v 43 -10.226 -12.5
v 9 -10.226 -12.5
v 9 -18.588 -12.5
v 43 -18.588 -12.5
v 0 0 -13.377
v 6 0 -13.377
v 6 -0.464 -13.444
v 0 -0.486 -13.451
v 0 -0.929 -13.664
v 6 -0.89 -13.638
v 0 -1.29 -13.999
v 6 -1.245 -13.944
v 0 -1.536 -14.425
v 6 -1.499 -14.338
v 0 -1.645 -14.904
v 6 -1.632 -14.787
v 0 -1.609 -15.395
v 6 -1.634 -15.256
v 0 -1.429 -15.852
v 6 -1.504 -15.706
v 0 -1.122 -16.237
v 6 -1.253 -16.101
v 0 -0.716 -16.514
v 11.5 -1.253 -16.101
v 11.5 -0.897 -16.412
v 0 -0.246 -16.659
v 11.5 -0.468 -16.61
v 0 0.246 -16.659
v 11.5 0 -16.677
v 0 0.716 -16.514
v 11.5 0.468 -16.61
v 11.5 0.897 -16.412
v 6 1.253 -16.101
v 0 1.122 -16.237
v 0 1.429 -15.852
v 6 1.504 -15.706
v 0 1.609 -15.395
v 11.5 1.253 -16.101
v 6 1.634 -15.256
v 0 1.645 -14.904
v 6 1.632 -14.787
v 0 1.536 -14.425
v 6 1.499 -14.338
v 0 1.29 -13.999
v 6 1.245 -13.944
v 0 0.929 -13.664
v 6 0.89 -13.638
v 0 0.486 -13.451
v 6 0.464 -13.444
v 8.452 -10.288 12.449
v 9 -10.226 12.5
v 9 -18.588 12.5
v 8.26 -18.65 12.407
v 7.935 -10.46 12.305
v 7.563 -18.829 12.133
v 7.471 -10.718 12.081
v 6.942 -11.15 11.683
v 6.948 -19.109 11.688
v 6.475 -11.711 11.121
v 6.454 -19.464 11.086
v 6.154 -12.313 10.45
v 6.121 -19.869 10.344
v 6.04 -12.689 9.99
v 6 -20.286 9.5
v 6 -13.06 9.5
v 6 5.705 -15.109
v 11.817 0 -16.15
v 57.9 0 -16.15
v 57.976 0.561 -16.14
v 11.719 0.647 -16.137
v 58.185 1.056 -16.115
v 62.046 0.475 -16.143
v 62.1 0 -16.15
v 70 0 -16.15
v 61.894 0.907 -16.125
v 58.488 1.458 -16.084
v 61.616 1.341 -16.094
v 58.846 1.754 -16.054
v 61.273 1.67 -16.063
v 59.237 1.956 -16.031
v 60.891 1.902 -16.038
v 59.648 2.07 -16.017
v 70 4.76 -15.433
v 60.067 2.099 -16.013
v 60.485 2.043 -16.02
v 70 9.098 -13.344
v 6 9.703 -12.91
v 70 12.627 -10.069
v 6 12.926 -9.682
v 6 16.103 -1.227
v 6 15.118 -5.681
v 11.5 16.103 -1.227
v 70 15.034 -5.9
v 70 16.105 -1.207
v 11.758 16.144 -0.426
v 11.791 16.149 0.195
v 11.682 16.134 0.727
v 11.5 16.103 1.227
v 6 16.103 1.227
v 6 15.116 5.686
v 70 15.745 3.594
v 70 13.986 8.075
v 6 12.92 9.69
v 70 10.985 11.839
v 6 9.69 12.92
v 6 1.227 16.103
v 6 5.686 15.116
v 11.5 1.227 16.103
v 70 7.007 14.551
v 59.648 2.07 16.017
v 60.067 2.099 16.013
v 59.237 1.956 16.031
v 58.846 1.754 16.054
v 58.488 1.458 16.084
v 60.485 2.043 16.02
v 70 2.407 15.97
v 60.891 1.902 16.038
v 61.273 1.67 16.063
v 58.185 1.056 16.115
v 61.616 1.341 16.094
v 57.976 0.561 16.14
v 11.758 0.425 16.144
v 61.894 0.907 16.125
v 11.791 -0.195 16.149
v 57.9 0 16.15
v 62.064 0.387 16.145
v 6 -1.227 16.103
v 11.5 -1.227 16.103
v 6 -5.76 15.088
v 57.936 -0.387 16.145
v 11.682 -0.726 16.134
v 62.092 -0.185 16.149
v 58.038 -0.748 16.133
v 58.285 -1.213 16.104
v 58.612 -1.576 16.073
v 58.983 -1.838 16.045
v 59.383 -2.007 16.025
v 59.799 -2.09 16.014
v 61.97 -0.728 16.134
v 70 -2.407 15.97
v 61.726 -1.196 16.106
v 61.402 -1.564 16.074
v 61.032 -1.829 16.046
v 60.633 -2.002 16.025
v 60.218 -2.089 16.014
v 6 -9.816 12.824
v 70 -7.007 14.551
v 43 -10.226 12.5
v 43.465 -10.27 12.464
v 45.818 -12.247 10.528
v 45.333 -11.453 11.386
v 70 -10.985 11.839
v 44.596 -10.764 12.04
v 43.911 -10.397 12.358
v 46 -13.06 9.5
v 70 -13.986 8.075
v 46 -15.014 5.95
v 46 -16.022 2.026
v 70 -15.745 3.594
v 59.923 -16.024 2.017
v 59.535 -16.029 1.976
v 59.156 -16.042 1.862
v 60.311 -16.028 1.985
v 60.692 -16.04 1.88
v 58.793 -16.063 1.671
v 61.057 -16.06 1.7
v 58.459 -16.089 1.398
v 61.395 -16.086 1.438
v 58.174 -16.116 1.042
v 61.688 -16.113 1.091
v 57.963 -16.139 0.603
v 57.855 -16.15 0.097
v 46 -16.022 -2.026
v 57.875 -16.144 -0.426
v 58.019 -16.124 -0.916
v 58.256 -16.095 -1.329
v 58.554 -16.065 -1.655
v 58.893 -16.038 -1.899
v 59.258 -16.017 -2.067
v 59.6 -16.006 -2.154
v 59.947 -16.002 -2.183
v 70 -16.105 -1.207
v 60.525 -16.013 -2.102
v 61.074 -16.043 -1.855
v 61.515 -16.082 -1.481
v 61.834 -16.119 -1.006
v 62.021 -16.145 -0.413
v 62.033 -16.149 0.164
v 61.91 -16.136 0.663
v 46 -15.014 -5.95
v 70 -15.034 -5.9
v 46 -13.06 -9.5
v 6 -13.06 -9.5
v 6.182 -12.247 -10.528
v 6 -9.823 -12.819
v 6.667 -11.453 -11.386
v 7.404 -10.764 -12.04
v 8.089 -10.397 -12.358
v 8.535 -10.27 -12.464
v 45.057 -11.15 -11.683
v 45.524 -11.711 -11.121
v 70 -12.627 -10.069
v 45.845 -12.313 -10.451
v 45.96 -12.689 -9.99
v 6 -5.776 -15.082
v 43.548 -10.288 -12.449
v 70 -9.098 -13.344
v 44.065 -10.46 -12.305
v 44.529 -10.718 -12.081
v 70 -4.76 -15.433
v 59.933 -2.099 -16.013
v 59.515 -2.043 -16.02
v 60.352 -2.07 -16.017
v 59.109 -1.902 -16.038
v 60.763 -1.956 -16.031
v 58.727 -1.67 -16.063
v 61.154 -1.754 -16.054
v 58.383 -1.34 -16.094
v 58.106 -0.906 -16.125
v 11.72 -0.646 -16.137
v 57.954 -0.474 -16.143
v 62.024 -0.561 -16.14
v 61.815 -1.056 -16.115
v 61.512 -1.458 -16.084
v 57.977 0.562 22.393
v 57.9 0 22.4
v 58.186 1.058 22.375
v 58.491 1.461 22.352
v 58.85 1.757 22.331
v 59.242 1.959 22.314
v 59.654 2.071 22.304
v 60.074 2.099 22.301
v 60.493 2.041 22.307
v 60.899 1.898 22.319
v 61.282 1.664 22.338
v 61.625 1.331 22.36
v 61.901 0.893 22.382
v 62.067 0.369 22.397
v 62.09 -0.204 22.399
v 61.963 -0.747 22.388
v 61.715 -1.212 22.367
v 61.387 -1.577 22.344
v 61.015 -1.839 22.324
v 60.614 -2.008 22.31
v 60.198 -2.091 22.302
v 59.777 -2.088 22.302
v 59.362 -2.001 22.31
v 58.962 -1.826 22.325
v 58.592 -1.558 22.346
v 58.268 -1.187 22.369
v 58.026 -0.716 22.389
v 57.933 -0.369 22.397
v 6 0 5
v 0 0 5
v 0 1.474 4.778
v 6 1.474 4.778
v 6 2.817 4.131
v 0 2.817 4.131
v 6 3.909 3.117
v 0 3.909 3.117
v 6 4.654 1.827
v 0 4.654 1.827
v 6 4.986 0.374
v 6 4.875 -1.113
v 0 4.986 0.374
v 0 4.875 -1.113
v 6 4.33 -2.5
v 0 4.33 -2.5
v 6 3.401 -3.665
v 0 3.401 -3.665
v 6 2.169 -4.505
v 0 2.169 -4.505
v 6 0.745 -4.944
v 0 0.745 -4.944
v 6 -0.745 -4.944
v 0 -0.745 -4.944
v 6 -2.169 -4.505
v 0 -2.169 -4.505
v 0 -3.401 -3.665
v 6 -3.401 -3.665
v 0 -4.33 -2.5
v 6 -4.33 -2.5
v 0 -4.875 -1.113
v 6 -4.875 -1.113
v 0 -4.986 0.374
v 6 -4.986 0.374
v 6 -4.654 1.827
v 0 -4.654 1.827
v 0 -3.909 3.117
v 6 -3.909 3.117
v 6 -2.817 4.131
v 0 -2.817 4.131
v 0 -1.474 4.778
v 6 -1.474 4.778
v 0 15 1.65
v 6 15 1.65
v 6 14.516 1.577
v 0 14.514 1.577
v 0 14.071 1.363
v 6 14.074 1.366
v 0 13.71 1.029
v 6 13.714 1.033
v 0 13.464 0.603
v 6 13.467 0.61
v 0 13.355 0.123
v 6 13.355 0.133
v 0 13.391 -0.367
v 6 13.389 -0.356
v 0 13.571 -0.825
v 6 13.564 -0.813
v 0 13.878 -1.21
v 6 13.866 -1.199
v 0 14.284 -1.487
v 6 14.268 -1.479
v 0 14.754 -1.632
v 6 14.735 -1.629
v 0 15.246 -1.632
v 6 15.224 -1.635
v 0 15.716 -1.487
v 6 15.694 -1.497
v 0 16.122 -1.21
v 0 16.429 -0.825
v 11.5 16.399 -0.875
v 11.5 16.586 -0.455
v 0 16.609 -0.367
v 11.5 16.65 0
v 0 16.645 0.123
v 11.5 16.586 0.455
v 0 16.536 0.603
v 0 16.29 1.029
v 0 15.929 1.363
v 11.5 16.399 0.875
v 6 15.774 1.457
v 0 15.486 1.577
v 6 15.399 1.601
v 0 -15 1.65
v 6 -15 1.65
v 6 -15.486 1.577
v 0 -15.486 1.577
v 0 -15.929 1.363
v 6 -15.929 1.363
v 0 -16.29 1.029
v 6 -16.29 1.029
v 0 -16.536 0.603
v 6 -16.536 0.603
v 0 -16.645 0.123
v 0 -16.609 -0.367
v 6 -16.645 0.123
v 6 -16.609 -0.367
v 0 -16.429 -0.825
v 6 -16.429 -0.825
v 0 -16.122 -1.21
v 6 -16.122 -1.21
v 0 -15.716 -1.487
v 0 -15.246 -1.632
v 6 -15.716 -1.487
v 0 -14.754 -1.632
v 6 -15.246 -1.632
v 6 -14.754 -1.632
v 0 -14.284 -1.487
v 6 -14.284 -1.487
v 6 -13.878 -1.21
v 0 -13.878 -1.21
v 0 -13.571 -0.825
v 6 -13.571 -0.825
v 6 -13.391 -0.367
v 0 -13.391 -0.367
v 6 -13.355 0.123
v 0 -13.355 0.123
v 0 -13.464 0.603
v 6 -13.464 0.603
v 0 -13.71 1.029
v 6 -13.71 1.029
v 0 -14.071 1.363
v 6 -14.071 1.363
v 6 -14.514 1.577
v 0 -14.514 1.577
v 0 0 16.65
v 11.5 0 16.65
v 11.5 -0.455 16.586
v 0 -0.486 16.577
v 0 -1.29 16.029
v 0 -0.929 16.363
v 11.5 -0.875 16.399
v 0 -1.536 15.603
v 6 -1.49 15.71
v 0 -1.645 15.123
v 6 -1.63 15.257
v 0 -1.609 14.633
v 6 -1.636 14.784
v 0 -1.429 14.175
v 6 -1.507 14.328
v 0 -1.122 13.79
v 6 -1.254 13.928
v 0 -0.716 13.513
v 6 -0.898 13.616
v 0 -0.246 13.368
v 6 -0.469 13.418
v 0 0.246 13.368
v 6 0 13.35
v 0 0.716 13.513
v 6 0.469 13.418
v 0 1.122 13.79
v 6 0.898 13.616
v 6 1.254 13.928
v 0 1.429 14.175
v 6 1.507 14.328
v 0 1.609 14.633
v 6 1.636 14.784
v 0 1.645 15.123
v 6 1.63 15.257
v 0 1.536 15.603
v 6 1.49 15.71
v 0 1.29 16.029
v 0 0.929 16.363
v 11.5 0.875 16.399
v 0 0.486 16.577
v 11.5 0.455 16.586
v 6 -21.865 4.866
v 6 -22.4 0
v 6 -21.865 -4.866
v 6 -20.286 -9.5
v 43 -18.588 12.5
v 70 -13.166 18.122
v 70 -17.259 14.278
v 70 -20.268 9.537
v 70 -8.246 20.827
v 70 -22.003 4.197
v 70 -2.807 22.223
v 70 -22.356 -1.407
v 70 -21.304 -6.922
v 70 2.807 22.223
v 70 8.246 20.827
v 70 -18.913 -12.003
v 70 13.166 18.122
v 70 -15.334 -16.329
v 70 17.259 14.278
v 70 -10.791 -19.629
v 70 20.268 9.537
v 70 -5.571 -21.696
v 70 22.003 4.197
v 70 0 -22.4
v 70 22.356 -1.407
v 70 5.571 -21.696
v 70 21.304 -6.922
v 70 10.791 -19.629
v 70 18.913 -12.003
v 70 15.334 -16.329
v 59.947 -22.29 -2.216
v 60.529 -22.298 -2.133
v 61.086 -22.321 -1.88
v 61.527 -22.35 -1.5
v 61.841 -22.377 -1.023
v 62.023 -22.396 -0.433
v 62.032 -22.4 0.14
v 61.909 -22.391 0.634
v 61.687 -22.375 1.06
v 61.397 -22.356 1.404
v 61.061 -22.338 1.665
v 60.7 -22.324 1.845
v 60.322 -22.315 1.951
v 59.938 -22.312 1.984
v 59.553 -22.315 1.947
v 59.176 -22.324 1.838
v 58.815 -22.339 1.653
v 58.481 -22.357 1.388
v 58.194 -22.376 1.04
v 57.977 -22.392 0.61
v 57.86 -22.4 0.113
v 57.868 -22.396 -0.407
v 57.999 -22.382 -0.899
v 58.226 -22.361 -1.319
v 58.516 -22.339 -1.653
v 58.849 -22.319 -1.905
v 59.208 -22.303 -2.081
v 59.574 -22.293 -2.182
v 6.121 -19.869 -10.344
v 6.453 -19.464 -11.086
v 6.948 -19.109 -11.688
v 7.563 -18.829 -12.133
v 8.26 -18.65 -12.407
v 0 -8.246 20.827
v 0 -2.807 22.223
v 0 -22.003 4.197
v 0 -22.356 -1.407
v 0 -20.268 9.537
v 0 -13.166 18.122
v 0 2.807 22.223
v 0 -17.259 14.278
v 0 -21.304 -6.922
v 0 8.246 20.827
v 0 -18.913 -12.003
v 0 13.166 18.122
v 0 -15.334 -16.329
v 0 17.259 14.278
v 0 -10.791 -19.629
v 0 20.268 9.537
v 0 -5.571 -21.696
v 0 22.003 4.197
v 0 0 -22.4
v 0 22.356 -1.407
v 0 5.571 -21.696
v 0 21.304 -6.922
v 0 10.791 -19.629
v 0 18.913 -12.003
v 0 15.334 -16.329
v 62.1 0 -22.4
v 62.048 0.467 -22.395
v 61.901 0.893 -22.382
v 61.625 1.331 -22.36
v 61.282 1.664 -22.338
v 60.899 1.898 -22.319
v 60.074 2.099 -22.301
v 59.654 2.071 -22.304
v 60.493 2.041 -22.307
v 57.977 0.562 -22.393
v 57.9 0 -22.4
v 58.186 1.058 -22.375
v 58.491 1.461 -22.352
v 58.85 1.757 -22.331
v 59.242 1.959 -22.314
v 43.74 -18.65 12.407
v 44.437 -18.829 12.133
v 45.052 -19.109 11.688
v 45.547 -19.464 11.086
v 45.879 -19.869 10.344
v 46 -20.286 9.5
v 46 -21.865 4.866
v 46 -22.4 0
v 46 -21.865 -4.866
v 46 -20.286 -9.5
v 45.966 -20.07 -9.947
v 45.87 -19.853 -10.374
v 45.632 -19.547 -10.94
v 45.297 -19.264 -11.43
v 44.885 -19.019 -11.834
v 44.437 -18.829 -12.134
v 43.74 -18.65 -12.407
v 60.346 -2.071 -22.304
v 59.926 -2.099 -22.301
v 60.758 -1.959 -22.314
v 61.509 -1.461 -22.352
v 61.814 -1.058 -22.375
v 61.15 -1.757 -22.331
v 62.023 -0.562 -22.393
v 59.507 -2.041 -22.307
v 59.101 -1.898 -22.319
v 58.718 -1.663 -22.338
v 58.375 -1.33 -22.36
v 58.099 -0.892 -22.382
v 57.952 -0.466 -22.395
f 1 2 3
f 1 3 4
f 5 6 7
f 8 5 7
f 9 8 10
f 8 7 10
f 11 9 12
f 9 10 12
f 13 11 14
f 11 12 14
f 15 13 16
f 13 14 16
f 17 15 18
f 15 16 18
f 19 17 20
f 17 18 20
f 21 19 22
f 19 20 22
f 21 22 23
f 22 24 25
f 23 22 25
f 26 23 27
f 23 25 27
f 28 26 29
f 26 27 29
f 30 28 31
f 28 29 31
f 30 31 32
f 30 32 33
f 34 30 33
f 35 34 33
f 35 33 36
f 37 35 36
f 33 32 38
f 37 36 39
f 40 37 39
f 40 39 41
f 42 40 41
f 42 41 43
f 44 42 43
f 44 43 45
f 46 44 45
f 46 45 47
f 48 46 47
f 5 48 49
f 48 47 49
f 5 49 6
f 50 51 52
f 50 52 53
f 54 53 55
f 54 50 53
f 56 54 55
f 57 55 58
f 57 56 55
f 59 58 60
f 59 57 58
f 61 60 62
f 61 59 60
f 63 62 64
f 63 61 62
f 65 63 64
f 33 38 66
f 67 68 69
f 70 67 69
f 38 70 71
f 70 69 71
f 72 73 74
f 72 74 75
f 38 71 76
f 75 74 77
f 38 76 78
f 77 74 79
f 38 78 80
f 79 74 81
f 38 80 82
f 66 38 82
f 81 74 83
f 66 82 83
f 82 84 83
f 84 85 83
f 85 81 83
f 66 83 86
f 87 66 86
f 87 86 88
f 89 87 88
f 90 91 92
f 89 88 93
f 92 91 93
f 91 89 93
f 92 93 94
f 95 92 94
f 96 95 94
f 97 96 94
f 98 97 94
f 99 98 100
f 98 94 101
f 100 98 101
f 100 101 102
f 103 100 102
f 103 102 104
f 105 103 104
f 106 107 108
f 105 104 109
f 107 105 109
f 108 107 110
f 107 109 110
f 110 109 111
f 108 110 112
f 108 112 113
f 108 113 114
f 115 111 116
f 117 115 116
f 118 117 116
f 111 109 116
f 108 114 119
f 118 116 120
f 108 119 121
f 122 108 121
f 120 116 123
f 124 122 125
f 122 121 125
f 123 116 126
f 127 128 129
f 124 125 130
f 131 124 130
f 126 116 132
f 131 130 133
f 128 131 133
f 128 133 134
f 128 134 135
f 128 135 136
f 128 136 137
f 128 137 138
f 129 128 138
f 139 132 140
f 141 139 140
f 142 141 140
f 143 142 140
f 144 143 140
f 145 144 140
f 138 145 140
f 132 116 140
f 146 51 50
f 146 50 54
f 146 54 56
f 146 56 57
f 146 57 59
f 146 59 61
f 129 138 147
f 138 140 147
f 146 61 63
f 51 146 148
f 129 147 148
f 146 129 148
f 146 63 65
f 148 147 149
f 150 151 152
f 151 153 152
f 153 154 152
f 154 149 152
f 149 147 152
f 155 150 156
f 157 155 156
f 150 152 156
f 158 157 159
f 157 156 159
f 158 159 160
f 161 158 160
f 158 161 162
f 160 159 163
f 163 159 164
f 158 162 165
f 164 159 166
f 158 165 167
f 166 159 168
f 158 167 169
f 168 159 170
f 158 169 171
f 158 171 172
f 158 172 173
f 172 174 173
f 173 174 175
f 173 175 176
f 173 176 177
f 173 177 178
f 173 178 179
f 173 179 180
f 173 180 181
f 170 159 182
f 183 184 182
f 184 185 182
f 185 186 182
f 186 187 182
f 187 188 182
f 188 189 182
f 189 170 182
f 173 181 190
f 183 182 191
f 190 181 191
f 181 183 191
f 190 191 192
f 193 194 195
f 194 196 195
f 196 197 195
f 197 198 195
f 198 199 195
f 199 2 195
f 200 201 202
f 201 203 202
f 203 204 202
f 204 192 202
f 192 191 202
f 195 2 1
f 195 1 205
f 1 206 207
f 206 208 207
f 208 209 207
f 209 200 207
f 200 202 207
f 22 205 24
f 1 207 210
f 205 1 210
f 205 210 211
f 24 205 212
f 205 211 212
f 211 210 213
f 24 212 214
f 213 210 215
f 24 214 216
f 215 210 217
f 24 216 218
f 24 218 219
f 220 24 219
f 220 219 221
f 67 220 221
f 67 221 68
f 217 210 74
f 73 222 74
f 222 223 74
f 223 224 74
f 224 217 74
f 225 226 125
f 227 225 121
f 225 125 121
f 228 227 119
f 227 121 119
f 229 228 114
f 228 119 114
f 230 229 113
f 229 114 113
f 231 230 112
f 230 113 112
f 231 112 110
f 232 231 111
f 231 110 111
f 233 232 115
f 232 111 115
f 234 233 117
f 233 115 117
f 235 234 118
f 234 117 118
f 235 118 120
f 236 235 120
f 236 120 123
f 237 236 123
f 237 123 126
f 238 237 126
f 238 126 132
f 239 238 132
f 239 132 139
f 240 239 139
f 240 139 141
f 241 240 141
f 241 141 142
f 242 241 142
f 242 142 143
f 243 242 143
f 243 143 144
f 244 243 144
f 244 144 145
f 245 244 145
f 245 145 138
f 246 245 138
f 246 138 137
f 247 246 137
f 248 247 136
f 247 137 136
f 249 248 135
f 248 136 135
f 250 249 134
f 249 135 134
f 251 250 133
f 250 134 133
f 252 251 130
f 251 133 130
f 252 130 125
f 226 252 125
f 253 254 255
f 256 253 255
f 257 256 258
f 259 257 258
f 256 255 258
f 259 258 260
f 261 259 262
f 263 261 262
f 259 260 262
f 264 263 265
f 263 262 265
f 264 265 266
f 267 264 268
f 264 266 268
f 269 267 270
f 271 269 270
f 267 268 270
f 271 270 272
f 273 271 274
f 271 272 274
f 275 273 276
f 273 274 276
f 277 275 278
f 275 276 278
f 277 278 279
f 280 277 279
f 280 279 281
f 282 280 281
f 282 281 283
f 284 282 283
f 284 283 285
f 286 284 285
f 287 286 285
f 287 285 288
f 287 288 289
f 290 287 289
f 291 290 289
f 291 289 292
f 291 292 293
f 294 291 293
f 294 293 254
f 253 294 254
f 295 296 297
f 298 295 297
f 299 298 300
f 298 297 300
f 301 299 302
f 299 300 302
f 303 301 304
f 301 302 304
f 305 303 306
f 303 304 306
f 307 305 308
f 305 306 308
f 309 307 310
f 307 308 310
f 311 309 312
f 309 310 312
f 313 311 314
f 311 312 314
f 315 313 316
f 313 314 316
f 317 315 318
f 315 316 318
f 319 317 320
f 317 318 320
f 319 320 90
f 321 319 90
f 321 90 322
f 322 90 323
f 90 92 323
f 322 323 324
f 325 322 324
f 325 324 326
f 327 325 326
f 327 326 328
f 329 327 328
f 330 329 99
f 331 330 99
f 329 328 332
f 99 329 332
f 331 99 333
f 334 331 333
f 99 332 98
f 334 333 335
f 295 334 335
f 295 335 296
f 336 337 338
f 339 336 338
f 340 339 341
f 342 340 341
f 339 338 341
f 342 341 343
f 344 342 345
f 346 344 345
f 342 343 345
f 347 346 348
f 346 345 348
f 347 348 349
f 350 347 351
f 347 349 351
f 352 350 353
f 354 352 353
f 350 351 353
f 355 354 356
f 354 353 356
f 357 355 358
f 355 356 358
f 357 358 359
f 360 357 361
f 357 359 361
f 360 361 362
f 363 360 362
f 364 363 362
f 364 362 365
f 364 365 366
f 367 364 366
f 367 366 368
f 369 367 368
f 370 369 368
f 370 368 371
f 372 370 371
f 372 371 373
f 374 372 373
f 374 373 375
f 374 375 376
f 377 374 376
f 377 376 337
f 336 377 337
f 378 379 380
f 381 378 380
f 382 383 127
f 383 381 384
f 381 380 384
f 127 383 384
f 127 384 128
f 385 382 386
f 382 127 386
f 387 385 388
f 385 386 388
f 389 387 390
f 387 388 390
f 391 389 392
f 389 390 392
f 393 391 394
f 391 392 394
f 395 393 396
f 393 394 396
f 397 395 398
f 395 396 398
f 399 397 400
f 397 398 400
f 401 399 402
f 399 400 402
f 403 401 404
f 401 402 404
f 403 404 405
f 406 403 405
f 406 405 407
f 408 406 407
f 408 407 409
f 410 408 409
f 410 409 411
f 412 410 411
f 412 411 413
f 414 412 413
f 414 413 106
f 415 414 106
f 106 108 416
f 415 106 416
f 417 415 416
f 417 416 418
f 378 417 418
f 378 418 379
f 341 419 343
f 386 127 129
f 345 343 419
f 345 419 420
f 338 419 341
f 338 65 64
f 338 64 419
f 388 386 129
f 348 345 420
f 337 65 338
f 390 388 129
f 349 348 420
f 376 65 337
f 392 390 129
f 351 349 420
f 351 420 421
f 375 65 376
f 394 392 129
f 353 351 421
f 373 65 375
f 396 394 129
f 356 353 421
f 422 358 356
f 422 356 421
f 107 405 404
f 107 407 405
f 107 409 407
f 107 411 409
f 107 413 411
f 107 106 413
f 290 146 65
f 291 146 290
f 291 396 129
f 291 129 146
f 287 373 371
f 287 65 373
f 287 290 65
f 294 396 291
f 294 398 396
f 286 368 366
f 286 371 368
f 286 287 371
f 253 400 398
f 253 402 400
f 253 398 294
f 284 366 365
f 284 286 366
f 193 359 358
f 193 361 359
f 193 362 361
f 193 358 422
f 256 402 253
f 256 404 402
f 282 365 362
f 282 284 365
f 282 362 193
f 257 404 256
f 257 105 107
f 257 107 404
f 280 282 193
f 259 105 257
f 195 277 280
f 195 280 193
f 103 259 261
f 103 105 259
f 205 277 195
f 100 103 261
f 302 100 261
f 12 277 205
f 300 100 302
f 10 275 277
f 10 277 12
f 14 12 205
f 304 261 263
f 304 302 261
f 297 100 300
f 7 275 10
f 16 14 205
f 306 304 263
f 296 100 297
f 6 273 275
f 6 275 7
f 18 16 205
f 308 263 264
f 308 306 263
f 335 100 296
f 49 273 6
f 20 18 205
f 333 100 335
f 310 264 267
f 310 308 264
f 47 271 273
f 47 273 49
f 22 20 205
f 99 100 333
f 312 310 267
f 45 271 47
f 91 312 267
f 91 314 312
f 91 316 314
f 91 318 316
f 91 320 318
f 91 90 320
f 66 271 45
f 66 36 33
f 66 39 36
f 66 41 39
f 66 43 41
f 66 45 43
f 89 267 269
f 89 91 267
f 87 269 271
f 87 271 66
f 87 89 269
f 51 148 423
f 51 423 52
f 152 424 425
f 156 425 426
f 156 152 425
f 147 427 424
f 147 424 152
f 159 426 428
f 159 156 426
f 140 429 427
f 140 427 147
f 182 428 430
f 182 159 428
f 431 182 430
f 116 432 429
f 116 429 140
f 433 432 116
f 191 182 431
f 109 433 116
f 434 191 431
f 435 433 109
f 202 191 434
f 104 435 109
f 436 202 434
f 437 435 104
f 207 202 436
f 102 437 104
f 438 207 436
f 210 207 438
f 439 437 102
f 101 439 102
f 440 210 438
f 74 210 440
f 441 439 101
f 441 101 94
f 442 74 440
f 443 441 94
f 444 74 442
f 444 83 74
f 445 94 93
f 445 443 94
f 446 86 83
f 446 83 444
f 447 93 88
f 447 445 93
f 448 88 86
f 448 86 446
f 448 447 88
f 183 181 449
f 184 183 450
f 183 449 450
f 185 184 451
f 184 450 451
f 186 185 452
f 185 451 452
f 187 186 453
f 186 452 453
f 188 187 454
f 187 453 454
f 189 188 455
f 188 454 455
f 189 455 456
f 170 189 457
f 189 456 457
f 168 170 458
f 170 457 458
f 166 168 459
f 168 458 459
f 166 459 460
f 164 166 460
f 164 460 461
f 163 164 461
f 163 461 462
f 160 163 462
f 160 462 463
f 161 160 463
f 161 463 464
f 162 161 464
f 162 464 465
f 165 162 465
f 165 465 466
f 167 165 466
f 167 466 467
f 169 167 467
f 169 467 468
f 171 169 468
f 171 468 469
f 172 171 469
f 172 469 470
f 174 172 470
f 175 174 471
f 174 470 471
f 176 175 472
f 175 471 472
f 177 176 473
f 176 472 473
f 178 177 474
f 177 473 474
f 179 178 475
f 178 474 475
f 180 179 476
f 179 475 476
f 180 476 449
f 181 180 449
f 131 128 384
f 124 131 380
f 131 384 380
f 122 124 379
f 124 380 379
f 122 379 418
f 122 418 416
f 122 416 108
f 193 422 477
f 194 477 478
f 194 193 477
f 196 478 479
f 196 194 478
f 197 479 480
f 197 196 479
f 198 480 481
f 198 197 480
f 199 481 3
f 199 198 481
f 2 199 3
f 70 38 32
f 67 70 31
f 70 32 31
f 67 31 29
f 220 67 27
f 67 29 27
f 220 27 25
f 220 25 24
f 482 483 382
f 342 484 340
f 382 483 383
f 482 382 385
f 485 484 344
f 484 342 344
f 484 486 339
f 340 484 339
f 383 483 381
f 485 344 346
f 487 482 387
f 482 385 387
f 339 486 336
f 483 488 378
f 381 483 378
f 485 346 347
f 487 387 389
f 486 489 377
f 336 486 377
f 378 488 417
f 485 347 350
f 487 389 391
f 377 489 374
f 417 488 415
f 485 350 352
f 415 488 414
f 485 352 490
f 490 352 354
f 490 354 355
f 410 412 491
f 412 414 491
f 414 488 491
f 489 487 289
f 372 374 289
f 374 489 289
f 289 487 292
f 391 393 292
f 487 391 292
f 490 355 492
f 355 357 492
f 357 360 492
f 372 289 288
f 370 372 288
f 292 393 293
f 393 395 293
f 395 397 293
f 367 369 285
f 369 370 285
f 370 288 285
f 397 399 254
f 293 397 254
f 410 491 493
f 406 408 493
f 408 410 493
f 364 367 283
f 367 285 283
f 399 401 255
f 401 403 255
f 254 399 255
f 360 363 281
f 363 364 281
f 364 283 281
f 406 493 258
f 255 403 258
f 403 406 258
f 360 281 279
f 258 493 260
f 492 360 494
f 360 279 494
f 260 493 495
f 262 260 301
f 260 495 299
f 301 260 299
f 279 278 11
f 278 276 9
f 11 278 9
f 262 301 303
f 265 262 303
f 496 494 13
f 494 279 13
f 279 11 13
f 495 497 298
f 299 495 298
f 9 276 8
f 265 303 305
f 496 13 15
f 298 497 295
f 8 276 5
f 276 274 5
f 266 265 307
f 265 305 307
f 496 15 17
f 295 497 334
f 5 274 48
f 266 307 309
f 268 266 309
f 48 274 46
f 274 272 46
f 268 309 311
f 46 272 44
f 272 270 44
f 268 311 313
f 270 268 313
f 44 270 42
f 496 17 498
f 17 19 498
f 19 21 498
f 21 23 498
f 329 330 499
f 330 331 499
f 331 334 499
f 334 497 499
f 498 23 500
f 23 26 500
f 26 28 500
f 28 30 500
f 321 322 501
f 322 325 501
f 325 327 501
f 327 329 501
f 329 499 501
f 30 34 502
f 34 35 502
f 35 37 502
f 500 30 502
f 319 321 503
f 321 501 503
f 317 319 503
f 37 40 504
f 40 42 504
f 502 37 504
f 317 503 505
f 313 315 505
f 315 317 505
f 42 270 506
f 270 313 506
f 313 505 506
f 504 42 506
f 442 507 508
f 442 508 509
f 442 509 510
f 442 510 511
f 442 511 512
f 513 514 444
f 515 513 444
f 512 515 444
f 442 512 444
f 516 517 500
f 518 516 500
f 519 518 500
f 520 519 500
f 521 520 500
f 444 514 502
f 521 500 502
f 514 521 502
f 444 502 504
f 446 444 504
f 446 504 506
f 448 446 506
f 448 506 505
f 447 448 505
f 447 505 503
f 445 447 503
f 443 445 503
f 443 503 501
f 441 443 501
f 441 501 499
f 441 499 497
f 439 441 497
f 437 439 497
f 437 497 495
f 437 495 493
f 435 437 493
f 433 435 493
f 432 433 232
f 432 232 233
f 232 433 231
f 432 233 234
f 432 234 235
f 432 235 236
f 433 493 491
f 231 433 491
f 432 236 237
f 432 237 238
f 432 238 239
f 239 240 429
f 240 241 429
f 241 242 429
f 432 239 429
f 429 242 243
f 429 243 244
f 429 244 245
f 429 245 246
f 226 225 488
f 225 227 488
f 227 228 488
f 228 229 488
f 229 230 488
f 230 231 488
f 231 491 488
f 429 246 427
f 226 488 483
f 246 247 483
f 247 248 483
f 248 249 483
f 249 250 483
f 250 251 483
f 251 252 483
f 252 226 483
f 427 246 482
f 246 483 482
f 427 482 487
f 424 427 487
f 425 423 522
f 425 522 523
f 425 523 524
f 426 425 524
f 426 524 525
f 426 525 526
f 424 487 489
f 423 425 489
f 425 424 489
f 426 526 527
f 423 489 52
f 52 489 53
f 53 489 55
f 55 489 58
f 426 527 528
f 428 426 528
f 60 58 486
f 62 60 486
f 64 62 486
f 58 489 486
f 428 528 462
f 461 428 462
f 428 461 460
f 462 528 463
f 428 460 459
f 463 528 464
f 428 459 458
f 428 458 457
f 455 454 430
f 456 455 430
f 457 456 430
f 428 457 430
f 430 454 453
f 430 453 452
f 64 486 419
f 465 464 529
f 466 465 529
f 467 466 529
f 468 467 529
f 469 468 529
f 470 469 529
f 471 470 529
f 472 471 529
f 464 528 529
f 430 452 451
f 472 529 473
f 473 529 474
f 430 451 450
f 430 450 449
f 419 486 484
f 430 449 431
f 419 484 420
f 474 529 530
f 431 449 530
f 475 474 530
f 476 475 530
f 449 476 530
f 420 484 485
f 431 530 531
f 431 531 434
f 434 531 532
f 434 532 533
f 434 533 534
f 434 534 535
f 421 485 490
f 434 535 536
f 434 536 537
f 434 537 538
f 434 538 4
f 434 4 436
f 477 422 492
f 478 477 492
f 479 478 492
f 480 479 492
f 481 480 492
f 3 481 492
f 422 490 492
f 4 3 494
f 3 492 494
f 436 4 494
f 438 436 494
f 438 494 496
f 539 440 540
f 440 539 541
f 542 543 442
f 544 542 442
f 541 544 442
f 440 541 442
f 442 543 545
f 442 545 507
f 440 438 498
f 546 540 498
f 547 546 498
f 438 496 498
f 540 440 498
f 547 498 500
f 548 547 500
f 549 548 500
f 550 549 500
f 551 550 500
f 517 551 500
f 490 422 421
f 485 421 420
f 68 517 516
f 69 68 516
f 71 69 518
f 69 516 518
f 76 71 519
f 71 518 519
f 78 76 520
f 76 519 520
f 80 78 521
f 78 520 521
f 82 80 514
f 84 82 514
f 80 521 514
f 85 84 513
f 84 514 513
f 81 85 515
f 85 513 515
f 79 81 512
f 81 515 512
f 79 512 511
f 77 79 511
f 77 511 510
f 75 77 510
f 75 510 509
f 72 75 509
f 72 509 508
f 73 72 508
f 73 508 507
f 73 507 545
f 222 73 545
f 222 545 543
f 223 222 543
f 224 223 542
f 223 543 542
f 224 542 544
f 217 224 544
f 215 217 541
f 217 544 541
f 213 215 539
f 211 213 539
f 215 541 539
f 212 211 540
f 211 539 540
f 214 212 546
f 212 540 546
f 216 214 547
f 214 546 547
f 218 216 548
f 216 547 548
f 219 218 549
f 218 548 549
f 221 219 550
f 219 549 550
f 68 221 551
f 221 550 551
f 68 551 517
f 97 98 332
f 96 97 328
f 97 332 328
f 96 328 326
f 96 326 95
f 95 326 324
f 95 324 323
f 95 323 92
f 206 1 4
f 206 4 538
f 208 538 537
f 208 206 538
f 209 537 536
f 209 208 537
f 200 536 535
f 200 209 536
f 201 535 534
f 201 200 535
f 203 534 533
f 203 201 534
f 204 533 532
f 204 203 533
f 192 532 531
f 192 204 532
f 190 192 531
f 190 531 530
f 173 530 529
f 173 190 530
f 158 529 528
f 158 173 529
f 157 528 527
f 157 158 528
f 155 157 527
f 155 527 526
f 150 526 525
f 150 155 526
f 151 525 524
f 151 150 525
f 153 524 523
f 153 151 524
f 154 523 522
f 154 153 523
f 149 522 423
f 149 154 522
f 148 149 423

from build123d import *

# Parameters (mm, degrees)
SKETCH1_R             = 22.4
EXTRUDE1_DEPTH        = 70
SKETCH2_R             = 16.15
EXTRUDE2_DEPTH        = 64
SKETCH3_R             = 5
EXTRUDE3_DEPTH        = 10
EXTRUDE5_DEPTH        = 30
M5_TAPPED_HOLE3_D     = 4.2
M5_TAPPED_HOLE5_D     = 4.2
M5_TAPPED_HOLE5_DEPTH = 14
M5_TAPPED_HOLE5_TIP   = 1.2618073
M4_TAPPED_HOLE1_D     = 3.3
M4_TAPPED_HOLE1_DEPTH = 11.5
M4_TAPPED_HOLE1_TIP   = 0.991420021


with BuildPart() as part:
    # Sketch1 → Extrude1 (new body)
    with BuildSketch(Plane(origin=(0, 0, 0), x_dir=(0, 0, -1), z_dir=(1, 0, 0))):
        Circle(SKETCH1_R)
    extrude(amount=EXTRUDE1_DEPTH)

    # Sketch2 → Extrude2 (cut)
    with BuildSketch(Plane(origin=(70, 0, 0), x_dir=(0, 0, -1), z_dir=(1, 0, 0))):
        Circle(SKETCH2_R)
    extrude(amount=-EXTRUDE2_DEPTH, mode=Mode.SUBTRACT)

    # Sketch3 → Extrude3 (cut)
    with BuildSketch(Plane.ZY):
        Circle(SKETCH3_R)
    extrude(amount=-EXTRUDE3_DEPTH, mode=Mode.SUBTRACT)

    # Sketch7 → Extrude5 (cut)
    with BuildSketch(Plane(origin=(0, 0, 0), x_dir=(1, 0, 0), z_dir=(0, 1, 0))):
        with BuildLine():
            Line((9, 12.5), (43, 12.5))
            ThreePointArc((43, 12.5), (45.121320344, 11.621320344), (46, 9.5))
            Line((46, 9.5), (46, -9.5))
            ThreePointArc((46, -9.5), (45.121320344, -11.621320344), (43, -12.5))
            Line((43, -12.5), (9, -12.5))
            ThreePointArc((9, -12.5), (6.878679656, -11.621320344), (6, -9.5))
            Line((6, -9.5), (6, 9.5))
            ThreePointArc((6, 9.5), (6.878679656, 11.621320344), (9, 12.5))
        make_face()
    extrude(amount=-EXTRUDE5_DEPTH, mode=Mode.SUBTRACT)

    # M5 Tapped Hole3 (through all)
    with Locations(Plane(origin=(60, 0, 22.4), x_dir=(1, 0, 0), z_dir=(0, 0, 1))):
        with Locations((0, 0)):
            Hole(M5_TAPPED_HOLE3_D / 2)

    # M5 Tapped Hole5
    with Locations(Plane(origin=(59.947350676, -16.149783021, -0.083715942), x_dir=(0, -0.005183649651, 0.999986564798), z_dir=(0, 0.999986564798, 0.005183649651))):
        with Locations((0, 0)):
            Hole(M5_TAPPED_HOLE5_D / 2, depth=M5_TAPPED_HOLE5_DEPTH)
            with Locations((0, 0, -(M5_TAPPED_HOLE5_DEPTH + M5_TAPPED_HOLE5_TIP / 2))):  # 118° drill point
                Cone(0, M5_TAPPED_HOLE5_D / 2, M5_TAPPED_HOLE5_TIP, mode=Mode.SUBTRACT)

    # M4 Tapped Hole1
    with Locations(Plane(origin=(0, 0, -15.027388536), x_dir=(0, 0, -1), z_dir=(-1, 0, 0))):
        with Locations((0, 0), (-15.027388536, -15), (-30.027388536, 0), (-15.027388536, 15)):
            Hole(M4_TAPPED_HOLE1_D / 2, depth=M4_TAPPED_HOLE1_DEPTH)
            with Locations((0, 0, -(M4_TAPPED_HOLE1_DEPTH + M4_TAPPED_HOLE1_TIP / 2))):  # 118° drill point
                Cone(0, M4_TAPPED_HOLE1_D / 2, M4_TAPPED_HOLE1_TIP, mode=Mode.SUBTRACT)


solid = part.part
